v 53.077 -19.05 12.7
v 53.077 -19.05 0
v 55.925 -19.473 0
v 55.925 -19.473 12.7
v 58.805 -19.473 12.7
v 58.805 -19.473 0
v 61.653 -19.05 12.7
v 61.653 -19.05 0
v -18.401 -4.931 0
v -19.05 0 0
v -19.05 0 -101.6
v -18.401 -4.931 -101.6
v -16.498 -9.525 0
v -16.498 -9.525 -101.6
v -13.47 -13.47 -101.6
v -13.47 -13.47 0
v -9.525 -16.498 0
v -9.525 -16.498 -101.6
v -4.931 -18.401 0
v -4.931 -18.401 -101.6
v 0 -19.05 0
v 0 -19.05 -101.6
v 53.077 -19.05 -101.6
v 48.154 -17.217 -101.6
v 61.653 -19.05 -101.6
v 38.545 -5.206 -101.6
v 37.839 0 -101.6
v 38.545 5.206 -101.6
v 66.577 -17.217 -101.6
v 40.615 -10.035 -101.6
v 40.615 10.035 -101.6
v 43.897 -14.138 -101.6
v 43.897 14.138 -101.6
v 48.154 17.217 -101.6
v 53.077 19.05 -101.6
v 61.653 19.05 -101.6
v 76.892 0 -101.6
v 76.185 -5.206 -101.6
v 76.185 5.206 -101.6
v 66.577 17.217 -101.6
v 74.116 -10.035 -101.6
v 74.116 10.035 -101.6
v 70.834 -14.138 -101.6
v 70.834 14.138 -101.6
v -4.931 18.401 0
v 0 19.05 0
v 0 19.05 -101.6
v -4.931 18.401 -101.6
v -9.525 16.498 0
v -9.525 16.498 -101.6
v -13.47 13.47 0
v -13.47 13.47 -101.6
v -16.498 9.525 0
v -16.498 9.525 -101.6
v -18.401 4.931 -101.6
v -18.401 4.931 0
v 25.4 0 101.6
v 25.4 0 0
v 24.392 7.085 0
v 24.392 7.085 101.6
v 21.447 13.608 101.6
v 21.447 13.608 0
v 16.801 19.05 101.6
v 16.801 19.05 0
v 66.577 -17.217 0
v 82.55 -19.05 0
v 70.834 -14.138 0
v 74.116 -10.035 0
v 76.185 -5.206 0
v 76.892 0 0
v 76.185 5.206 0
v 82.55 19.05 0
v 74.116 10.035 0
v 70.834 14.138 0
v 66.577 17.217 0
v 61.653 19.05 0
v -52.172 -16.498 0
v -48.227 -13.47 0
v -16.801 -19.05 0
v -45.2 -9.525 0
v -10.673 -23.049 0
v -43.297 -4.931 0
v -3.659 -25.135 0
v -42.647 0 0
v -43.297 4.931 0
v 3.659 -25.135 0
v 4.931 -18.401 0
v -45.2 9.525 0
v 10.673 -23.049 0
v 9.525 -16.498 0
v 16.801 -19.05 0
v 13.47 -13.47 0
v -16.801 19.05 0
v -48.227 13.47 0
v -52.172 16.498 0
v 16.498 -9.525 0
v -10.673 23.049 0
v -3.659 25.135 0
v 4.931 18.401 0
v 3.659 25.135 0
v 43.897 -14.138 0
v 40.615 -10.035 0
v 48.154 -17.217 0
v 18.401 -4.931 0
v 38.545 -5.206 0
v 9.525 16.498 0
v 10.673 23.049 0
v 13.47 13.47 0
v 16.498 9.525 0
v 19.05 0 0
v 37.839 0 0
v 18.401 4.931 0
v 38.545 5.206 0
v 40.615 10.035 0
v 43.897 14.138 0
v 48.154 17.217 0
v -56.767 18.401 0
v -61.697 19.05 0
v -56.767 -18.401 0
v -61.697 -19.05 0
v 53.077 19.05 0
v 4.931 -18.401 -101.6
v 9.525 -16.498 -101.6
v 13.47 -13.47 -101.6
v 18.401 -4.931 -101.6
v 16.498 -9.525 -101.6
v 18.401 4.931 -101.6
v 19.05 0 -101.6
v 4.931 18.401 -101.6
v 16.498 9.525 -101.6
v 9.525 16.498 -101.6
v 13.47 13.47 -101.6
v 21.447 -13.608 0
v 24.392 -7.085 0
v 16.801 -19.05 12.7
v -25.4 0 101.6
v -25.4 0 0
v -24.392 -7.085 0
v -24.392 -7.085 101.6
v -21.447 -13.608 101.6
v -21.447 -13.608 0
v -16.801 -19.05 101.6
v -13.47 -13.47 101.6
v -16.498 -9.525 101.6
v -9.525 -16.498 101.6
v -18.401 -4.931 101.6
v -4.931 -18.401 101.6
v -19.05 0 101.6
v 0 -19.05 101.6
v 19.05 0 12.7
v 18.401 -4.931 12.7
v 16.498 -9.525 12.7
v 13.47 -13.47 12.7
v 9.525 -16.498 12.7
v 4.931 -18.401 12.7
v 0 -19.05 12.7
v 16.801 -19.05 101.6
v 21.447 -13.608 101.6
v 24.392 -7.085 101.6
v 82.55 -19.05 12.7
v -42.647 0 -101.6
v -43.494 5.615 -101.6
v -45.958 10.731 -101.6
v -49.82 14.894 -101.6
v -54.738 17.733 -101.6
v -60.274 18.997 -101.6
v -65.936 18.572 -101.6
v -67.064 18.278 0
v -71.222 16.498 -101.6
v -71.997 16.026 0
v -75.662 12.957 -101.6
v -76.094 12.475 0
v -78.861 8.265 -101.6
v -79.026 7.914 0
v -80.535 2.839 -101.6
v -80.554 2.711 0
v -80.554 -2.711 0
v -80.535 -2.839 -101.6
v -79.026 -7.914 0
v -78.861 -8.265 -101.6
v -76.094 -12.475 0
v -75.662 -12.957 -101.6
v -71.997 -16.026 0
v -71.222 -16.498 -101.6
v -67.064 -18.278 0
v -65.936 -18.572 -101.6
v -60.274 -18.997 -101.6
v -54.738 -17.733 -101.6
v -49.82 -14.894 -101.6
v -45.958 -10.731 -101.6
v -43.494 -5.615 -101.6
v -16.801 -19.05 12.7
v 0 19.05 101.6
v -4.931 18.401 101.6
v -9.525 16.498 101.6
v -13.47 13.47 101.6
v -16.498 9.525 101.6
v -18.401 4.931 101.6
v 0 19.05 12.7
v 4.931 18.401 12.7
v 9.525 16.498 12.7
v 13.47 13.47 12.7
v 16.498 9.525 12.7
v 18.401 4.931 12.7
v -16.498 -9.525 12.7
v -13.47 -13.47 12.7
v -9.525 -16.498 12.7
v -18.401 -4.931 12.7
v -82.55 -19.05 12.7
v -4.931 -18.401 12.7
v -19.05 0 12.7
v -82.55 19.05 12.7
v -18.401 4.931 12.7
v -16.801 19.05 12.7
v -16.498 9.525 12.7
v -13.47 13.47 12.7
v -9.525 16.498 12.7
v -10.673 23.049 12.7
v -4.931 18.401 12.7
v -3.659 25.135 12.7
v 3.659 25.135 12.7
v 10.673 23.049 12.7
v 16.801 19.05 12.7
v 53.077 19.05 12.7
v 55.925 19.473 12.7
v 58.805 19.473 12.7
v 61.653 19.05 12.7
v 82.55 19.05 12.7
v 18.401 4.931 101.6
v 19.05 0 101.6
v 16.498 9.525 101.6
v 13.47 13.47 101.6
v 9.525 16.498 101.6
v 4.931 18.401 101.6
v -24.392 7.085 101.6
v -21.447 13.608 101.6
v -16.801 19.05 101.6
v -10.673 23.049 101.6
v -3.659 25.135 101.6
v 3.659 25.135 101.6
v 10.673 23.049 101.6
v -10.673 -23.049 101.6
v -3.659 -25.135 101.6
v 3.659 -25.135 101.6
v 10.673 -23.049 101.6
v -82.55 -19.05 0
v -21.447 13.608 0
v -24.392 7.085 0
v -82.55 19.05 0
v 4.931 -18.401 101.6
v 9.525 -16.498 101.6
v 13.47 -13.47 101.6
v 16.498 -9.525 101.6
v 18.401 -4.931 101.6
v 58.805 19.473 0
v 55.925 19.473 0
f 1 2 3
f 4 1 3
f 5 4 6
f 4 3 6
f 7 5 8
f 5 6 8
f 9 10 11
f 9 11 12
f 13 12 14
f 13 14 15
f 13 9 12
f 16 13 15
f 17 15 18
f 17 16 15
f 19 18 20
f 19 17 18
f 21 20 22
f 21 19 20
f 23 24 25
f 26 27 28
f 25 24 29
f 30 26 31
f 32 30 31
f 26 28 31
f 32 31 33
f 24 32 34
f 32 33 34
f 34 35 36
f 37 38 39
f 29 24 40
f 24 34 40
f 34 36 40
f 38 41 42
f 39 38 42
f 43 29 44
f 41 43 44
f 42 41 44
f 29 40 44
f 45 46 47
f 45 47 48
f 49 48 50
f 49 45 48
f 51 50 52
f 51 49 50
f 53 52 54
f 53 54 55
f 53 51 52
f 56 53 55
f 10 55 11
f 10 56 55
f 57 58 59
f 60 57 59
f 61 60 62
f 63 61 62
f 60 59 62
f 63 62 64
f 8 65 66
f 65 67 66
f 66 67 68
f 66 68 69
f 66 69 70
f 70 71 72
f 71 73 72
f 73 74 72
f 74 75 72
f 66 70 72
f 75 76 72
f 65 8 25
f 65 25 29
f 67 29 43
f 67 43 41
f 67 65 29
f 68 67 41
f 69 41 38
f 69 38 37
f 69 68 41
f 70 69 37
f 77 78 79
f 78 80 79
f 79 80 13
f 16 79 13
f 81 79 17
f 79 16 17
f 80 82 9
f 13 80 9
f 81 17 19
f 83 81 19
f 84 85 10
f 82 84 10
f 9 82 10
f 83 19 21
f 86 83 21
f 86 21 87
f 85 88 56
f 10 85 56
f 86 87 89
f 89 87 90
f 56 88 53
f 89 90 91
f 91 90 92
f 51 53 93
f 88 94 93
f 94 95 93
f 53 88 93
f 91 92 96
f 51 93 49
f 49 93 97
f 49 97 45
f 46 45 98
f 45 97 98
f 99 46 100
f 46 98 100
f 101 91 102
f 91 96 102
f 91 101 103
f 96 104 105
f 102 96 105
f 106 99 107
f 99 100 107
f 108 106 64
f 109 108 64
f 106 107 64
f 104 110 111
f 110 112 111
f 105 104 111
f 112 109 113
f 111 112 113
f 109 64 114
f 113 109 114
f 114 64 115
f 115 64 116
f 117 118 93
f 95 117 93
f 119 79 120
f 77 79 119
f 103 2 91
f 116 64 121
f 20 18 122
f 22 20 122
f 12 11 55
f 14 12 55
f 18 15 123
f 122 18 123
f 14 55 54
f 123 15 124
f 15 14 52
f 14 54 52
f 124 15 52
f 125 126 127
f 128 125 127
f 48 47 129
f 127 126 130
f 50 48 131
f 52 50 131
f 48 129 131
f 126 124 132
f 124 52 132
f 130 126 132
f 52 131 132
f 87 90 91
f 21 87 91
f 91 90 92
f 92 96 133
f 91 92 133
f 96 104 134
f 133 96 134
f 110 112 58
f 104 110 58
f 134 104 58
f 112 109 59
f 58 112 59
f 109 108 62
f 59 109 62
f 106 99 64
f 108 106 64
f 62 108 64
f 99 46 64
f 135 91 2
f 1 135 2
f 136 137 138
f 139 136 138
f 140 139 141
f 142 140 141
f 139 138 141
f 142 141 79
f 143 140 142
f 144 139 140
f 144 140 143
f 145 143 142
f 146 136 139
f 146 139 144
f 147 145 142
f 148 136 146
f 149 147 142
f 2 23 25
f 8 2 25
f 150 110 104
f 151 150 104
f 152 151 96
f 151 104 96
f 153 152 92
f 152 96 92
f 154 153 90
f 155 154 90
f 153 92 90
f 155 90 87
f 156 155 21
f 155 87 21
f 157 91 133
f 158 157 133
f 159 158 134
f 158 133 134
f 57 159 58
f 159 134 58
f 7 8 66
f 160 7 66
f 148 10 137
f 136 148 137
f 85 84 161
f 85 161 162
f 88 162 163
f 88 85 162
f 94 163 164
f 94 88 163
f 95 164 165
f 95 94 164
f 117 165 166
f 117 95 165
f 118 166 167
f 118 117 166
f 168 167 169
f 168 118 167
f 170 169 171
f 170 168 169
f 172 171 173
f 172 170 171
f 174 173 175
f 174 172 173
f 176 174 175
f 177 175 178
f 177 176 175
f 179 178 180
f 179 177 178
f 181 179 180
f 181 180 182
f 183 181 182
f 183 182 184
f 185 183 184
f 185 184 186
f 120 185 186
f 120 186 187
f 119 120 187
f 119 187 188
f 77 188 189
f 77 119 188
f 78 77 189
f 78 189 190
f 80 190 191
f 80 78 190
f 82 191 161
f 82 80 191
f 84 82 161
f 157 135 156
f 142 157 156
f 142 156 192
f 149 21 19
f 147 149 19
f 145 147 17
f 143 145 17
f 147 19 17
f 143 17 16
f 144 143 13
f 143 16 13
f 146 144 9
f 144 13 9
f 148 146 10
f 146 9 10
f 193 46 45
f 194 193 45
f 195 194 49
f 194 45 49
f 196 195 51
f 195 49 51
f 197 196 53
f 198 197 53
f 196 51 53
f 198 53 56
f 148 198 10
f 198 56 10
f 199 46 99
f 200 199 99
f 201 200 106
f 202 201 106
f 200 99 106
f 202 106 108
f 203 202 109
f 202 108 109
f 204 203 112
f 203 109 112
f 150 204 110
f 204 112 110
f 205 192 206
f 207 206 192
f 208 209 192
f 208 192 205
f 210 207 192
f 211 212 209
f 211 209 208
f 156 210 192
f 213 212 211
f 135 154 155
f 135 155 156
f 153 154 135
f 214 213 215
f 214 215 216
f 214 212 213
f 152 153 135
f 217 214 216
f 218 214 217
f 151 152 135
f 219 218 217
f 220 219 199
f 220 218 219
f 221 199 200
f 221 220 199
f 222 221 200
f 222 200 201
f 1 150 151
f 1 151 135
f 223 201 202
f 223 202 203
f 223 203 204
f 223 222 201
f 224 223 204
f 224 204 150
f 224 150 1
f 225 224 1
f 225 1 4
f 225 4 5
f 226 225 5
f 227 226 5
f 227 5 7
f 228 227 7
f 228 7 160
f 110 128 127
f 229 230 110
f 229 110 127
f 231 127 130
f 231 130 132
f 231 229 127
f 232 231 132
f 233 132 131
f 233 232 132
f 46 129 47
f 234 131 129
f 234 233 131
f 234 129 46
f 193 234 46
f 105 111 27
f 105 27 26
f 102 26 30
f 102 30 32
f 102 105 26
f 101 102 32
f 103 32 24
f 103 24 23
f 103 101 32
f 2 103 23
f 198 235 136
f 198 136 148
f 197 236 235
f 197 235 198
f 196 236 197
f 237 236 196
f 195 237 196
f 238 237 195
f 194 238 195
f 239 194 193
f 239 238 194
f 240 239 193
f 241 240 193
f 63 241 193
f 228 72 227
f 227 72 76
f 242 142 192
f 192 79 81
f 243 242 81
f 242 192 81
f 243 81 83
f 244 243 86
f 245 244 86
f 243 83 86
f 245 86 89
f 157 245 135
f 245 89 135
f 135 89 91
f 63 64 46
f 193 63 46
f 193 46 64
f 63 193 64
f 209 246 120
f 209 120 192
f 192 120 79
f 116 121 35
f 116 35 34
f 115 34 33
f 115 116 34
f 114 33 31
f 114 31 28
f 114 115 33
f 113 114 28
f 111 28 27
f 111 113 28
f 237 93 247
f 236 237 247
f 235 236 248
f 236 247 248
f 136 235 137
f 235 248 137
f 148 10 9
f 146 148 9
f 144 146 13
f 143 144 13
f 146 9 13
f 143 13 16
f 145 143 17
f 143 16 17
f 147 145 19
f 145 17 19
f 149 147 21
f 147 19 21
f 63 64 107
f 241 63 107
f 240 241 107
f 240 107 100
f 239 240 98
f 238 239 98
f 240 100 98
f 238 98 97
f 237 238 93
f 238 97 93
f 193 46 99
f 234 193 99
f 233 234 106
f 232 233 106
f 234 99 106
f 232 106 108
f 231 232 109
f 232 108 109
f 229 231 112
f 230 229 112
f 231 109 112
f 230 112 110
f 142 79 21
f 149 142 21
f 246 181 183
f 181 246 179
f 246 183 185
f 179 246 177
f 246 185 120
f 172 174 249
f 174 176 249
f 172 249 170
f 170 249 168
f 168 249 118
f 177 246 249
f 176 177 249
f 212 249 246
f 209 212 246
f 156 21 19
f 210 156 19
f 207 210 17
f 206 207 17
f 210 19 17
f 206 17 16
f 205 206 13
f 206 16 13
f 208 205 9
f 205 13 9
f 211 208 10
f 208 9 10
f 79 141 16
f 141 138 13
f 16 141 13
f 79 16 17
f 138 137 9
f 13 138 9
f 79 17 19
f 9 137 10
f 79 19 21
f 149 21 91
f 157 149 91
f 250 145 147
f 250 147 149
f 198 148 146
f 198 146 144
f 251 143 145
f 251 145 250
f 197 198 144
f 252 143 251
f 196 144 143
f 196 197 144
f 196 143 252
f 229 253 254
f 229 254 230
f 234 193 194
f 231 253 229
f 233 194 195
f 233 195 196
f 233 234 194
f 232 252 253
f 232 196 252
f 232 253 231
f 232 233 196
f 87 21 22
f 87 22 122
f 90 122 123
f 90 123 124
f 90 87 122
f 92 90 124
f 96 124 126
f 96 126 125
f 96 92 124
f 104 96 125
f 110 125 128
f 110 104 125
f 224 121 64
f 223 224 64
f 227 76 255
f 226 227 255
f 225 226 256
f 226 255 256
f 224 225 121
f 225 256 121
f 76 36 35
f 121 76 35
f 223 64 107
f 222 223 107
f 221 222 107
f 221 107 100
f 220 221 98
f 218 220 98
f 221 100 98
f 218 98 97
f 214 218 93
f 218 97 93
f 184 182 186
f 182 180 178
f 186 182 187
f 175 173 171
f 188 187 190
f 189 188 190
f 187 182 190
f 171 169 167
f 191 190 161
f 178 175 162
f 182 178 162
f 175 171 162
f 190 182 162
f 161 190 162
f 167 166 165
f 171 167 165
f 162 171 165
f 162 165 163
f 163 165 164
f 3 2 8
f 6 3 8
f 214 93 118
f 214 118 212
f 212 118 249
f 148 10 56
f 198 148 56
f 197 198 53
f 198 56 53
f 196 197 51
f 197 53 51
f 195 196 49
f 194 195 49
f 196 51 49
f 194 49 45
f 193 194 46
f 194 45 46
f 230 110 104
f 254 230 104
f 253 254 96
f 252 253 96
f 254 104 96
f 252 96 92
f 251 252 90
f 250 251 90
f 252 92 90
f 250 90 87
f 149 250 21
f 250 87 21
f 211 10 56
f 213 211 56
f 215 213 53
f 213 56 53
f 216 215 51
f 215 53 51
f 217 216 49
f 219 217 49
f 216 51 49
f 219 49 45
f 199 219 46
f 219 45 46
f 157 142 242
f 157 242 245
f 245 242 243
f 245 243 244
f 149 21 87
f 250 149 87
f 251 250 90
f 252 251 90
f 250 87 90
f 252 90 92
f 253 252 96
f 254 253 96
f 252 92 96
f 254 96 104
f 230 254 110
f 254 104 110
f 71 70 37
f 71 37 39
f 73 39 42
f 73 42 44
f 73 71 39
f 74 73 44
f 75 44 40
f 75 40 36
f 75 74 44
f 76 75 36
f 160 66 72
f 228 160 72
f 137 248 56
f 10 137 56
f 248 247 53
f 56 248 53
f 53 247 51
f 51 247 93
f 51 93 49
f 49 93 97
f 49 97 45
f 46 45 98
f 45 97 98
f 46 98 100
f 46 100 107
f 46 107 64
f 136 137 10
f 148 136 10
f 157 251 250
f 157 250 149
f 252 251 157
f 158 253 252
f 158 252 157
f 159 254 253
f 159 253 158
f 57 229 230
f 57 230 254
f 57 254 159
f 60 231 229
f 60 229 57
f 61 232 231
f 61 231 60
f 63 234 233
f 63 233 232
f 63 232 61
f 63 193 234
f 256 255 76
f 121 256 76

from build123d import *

# Parameters (mm, degrees)
F1_DEPTH = 101.6
F2_DEPTH = 12.7
F3_DEPTH = 101.6
F4_DEPTH = 101.6
F5_DEPTH = 101.6
F6_DEPTH = 101.6
F7_DEPTH = 101.6


with BuildPart() as f1:
    # F0 (on Top) → F1 (new body)
    with BuildSketch(Plane.XY):
        with BuildLine():
            Line((1.179e-07, 19.05), (-16.8005208253, 19.05))
            ThreePointArc((-16.8005208253, 19.05), (-23.1505208253, 10.4505208253), (-25.4, 0))
            Line((-25.4, 0), (-19.05, 0))
            ThreePointArc((-19.05, 0), (-13.4703841399, 13.4703842233), (1.179e-07, 19.05))
        make_face()
        with BuildLine():
            ThreePointArc((16.8005208253, 19.05), (0, 25.4), (-16.8005208253, 19.05))
            Line((-16.8005208253, 19.05), (1.179e-07, 19.05))
            Line((1.179e-07, 19.05), (16.8005208253, 19.05))
        make_face()
    extrude(amount=F1_DEPTH)


with BuildPart() as f1b:
    # F0 (on Top) → F1, piece 2 (new body)
    with BuildSketch(Plane.XY):
        with BuildLine():
            Line((3.1e-09, -19.05), (-16.8005208253, -19.05))
            ThreePointArc((-16.8005208253, -19.05), (0, -25.4), (16.8005208253, -19.05))
            Line((16.8005208253, -19.05), (3.1e-09, -19.05))
        make_face()
    extrude(amount=F1_DEPTH)

    # F0 (on Top) → F2 (join)
    with BuildSketch(Plane.XY):
        with BuildLine():
            Line((-61.6974197328, 19.05), (-82.55, 19.05))
            Line((-82.55, 19.05), (-82.55, -19.05))
            Line((-82.55, -19.05), (-61.6974197328, -19.05))
            ThreePointArc((-61.6974197328, -19.05), (-80.7474197328, 0), (-61.6974197328, 19.05))
        make_face()
        with BuildLine():
            Line((-16.8005208253, 19.05), (-61.6974197328, 19.05))
            ThreePointArc((-61.6974197328, 19.05), (-48.2270355512, 13.4703841816), (-42.6474197328, 0))
            Line((-42.6474197328, 0), (-25.4, 0))
            ThreePointArc((-25.4, 0), (-23.1505208253, 10.4505208253), (-16.8005208253, 19.05))
        make_face()
        with BuildLine():
            ThreePointArc((-42.6474197328, 0), (-48.2270355512, 13.4703841816), (-61.6974197328, 19.05))
            ThreePointArc((-61.6974197328, 19.05), (-80.7474197328, 0), (-61.6974197328, -19.05))
            ThreePointArc((-61.6974197328, -19.05), (-48.2270355512, -13.4703841816), (-42.6474197328, 0))
        make_face()
        with BuildLine():
            ThreePointArc((16.8005208253, 19.05), (0, 25.4), (-16.8005208253, 19.05))
            Line((-16.8005208253, 19.05), (1.179e-07, 19.05))
            Line((1.179e-07, 19.05), (16.8005208253, 19.05))
        make_face()
        with BuildLine():
            Line((1.179e-07, 19.05), (-16.8005208253, 19.05))
            ThreePointArc((-16.8005208253, 19.05), (-23.1505208253, 10.4505208253), (-25.4, 0))
            Line((-25.4, 0), (-19.05, 0))
            ThreePointArc((-19.05, 0), (-13.4703841399, 13.4703842233), (1.179e-07, 19.05))
        make_face()
        with BuildLine():
            Line((-25.4, 0), (-42.6474197328, 0))
            ThreePointArc((-42.6474197328, 0), (-48.2270355512, -13.4703841816), (-61.6974197328, -19.05))
            Line((-61.6974197328, -19.05), (-16.8005208253, -19.05))
            ThreePointArc((-16.8005208253, -19.05), (-23.1505208253, -10.4505208253), (-25.4, 0))
        make_face()
        with BuildLine():
            Line((16.8005208253, 19.05), (1.179e-07, 19.05))
            ThreePointArc((1.179e-07, 19.05), (13.4703842233, 13.4703841399), (19.05, 0))
            ThreePointArc((19.05, 0), (13.4703841827, -13.4703841805), (3.1e-09, -19.05))
            Line((3.1e-09, -19.05), (16.8005208253, -19.05))
            ThreePointArc((16.8005208253, -19.05), (23.1505208253, -10.4505208253), (25.4, 0))
            ThreePointArc((25.4, 0), (23.1505208253, 10.4505208253), (16.8005208253, 19.05))
        make_face()
        with BuildLine():
            Line((53.0774212664, 19.05), (16.8005208253, 19.05))
            ThreePointArc((16.8005208253, 19.05), (23.1505208253, 10.4505208253), (25.4, 0))
            Line((25.4, 0), (37.8385224377, 0))
            ThreePointArc((37.8385224377, 0), (42.1169707822, 12.1976077317), (53.0774212664, 19.05))
        make_face()
        with BuildLine():
            Line((-19.05, 0), (-25.4, 0))
            ThreePointArc((-25.4, 0), (-23.1505208253, -10.4505208253), (-16.8005208253, -19.05))
            Line((-16.8005208253, -19.05), (3.1e-09, -19.05))
            ThreePointArc((3.1e-09, -19.05), (-13.4703841805, -13.4703841827), (-19.05, 0))
        make_face()
        with BuildLine():
            Line((3.1e-09, -19.05), (-16.8005208253, -19.05))
            ThreePointArc((-16.8005208253, -19.05), (0, -25.4), (16.8005208253, -19.05))
            Line((16.8005208253, -19.05), (3.1e-09, -19.05))
        make_face()
        with BuildLine():
            ThreePointArc((61.6527431423, 19.05), (57.3650822043, 19.5265597666), (53.0774212664, 19.05))
            Line((53.0774212664, 19.05), (61.6527431423, 19.05))
        make_face()
        with BuildLine():
            Line((61.6527431423, 19.05), (53.0774212664, 19.05))
            ThreePointArc((53.0774212664, 19.05), (42.1169707822, 12.1976077317), (37.8385224377, 0))
            ThreePointArc((37.8385224377, 0), (42.1169707822, -12.1976077317), (53.0774212664, -19.05))
            Line((53.0774212664, -19.05), (61.6527431423, -19.05))
            ThreePointArc((61.6527431423, -19.05), (72.6131936265, -12.1976077317), (76.891641971, 0))
            ThreePointArc((76.891641971, 0), (72.6131936265, 12.1976077317), (61.6527431423, 19.05))
        make_face()
        with BuildLine():
            Line((37.8385224377, 0), (25.4, 0))
            ThreePointArc((25.4, 0), (23.1505208253, -10.4505208253), (16.8005208253, -19.05))
            Line((16.8005208253, -19.05), (53.0774212664, -19.05))
            ThreePointArc((53.0774212664, -19.05), (42.1169707822, -12.1976077317), (37.8385224377, 0))
        make_face()
        with BuildLine():
            Line((82.55, 19.05), (61.6527431423, 19.05))
            ThreePointArc((61.6527431423, 19.05), (72.6131936265, 12.1976077317), (76.891641971, 0))
            ThreePointArc((76.891641971, 0), (72.6131936265, -12.1976077317), (61.6527431423, -19.05))
            Line((61.6527431423, -19.05), (82.55, -19.05))
            Line((82.55, -19.05), (82.55, 19.05))
        make_face()
        with BuildLine():
            Line((61.6527431423, -19.05), (53.0774212664, -19.05))
            ThreePointArc((53.0774212664, -19.05), (57.3650822043, -19.5265597666), (61.6527431423, -19.05))
        make_face()
    extrude(amount=F2_DEPTH)

    # F0 (on Top) → F3 (join)
    with BuildSketch(Plane.XY):
        with BuildLine():
            ThreePointArc((-42.6474197328, 0), (-48.2270355512, 13.4703841816), (-61.6974197328, 19.05))
            ThreePointArc((-61.6974197328, 19.05), (-80.7474197328, 0), (-61.6974197328, -19.05))
            ThreePointArc((-61.6974197328, -19.05), (-48.2270355512, -13.4703841816), (-42.6474197328, 0))
        make_face()
    extrude(amount=-F3_DEPTH)

    # F0 (on Top) → F5 (join)
    with BuildSketch(Plane.XY):
        with BuildLine():
            Line((61.6527431423, 19.05), (53.0774212664, 19.05))
            ThreePointArc((53.0774212664, 19.05), (42.1169707822, 12.1976077317), (37.8385224377, 0))
            ThreePointArc((37.8385224377, 0), (42.1169707822, -12.1976077317), (53.0774212664, -19.05))
            Line((53.0774212664, -19.05), (61.6527431423, -19.05))
            ThreePointArc((61.6527431423, -19.05), (72.6131936265, -12.1976077317), (76.891641971, 0))
            ThreePointArc((76.891641971, 0), (72.6131936265, 12.1976077317), (61.6527431423, 19.05))
        make_face()
    extrude(amount=-F5_DEPTH)


with BuildPart() as f4:
    # F0 (on Top) → F4 (new body, symmetric)
    with BuildSketch(Plane.XY):
        with BuildLine():
            ThreePointArc((19.05, 0), (13.4703842233, 13.4703841399), (1.179e-07, 19.05))
            ThreePointArc((1.179e-07, 19.05), (-13.4703841399, 13.4703842233), (-19.05, 0))
            ThreePointArc((-19.05, 0), (-13.4703841805, -13.4703841827), (3.1e-09, -19.05))
            ThreePointArc((3.1e-09, -19.05), (13.4703841827, -13.4703841805), (19.05, 0))
        make_face()
    extrude(amount=F4_DEPTH, both=True)


with BuildPart() as f6:
    # F0 (on Top) → F6 (new body)
    with BuildSketch(Plane.XY):
        with BuildLine():
            Line((-19.05, 0), (-25.4, 0))
            ThreePointArc((-25.4, 0), (-23.1505208253, -10.4505208253), (-16.8005208253, -19.05))
            Line((-16.8005208253, -19.05), (3.1e-09, -19.05))
            ThreePointArc((3.1e-09, -19.05), (-13.4703841805, -13.4703841827), (-19.05, 0))
        make_face()
    extrude(amount=F6_DEPTH)


with BuildPart() as f7:
    # F0 (on Top) → F7 (new body)
    with BuildSketch(Plane.XY):
        with BuildLine():
            Line((16.8005208253, 19.05), (1.179e-07, 19.05))
            ThreePointArc((1.179e-07, 19.05), (13.4703842233, 13.4703841399), (19.05, 0))
            ThreePointArc((19.05, 0), (13.4703841827, -13.4703841805), (3.1e-09, -19.05))
            Line((3.1e-09, -19.05), (16.8005208253, -19.05))
            ThreePointArc((16.8005208253, -19.05), (23.1505208253, -10.4505208253), (25.4, 0))
            ThreePointArc((25.4, 0), (23.1505208253, 10.4505208253), (16.8005208253, 19.05))
        make_face()
    extrude(amount=F7_DEPTH)


solid = Compound([f1.part, f1b.part, f4.part, f6.part, f7.part])
